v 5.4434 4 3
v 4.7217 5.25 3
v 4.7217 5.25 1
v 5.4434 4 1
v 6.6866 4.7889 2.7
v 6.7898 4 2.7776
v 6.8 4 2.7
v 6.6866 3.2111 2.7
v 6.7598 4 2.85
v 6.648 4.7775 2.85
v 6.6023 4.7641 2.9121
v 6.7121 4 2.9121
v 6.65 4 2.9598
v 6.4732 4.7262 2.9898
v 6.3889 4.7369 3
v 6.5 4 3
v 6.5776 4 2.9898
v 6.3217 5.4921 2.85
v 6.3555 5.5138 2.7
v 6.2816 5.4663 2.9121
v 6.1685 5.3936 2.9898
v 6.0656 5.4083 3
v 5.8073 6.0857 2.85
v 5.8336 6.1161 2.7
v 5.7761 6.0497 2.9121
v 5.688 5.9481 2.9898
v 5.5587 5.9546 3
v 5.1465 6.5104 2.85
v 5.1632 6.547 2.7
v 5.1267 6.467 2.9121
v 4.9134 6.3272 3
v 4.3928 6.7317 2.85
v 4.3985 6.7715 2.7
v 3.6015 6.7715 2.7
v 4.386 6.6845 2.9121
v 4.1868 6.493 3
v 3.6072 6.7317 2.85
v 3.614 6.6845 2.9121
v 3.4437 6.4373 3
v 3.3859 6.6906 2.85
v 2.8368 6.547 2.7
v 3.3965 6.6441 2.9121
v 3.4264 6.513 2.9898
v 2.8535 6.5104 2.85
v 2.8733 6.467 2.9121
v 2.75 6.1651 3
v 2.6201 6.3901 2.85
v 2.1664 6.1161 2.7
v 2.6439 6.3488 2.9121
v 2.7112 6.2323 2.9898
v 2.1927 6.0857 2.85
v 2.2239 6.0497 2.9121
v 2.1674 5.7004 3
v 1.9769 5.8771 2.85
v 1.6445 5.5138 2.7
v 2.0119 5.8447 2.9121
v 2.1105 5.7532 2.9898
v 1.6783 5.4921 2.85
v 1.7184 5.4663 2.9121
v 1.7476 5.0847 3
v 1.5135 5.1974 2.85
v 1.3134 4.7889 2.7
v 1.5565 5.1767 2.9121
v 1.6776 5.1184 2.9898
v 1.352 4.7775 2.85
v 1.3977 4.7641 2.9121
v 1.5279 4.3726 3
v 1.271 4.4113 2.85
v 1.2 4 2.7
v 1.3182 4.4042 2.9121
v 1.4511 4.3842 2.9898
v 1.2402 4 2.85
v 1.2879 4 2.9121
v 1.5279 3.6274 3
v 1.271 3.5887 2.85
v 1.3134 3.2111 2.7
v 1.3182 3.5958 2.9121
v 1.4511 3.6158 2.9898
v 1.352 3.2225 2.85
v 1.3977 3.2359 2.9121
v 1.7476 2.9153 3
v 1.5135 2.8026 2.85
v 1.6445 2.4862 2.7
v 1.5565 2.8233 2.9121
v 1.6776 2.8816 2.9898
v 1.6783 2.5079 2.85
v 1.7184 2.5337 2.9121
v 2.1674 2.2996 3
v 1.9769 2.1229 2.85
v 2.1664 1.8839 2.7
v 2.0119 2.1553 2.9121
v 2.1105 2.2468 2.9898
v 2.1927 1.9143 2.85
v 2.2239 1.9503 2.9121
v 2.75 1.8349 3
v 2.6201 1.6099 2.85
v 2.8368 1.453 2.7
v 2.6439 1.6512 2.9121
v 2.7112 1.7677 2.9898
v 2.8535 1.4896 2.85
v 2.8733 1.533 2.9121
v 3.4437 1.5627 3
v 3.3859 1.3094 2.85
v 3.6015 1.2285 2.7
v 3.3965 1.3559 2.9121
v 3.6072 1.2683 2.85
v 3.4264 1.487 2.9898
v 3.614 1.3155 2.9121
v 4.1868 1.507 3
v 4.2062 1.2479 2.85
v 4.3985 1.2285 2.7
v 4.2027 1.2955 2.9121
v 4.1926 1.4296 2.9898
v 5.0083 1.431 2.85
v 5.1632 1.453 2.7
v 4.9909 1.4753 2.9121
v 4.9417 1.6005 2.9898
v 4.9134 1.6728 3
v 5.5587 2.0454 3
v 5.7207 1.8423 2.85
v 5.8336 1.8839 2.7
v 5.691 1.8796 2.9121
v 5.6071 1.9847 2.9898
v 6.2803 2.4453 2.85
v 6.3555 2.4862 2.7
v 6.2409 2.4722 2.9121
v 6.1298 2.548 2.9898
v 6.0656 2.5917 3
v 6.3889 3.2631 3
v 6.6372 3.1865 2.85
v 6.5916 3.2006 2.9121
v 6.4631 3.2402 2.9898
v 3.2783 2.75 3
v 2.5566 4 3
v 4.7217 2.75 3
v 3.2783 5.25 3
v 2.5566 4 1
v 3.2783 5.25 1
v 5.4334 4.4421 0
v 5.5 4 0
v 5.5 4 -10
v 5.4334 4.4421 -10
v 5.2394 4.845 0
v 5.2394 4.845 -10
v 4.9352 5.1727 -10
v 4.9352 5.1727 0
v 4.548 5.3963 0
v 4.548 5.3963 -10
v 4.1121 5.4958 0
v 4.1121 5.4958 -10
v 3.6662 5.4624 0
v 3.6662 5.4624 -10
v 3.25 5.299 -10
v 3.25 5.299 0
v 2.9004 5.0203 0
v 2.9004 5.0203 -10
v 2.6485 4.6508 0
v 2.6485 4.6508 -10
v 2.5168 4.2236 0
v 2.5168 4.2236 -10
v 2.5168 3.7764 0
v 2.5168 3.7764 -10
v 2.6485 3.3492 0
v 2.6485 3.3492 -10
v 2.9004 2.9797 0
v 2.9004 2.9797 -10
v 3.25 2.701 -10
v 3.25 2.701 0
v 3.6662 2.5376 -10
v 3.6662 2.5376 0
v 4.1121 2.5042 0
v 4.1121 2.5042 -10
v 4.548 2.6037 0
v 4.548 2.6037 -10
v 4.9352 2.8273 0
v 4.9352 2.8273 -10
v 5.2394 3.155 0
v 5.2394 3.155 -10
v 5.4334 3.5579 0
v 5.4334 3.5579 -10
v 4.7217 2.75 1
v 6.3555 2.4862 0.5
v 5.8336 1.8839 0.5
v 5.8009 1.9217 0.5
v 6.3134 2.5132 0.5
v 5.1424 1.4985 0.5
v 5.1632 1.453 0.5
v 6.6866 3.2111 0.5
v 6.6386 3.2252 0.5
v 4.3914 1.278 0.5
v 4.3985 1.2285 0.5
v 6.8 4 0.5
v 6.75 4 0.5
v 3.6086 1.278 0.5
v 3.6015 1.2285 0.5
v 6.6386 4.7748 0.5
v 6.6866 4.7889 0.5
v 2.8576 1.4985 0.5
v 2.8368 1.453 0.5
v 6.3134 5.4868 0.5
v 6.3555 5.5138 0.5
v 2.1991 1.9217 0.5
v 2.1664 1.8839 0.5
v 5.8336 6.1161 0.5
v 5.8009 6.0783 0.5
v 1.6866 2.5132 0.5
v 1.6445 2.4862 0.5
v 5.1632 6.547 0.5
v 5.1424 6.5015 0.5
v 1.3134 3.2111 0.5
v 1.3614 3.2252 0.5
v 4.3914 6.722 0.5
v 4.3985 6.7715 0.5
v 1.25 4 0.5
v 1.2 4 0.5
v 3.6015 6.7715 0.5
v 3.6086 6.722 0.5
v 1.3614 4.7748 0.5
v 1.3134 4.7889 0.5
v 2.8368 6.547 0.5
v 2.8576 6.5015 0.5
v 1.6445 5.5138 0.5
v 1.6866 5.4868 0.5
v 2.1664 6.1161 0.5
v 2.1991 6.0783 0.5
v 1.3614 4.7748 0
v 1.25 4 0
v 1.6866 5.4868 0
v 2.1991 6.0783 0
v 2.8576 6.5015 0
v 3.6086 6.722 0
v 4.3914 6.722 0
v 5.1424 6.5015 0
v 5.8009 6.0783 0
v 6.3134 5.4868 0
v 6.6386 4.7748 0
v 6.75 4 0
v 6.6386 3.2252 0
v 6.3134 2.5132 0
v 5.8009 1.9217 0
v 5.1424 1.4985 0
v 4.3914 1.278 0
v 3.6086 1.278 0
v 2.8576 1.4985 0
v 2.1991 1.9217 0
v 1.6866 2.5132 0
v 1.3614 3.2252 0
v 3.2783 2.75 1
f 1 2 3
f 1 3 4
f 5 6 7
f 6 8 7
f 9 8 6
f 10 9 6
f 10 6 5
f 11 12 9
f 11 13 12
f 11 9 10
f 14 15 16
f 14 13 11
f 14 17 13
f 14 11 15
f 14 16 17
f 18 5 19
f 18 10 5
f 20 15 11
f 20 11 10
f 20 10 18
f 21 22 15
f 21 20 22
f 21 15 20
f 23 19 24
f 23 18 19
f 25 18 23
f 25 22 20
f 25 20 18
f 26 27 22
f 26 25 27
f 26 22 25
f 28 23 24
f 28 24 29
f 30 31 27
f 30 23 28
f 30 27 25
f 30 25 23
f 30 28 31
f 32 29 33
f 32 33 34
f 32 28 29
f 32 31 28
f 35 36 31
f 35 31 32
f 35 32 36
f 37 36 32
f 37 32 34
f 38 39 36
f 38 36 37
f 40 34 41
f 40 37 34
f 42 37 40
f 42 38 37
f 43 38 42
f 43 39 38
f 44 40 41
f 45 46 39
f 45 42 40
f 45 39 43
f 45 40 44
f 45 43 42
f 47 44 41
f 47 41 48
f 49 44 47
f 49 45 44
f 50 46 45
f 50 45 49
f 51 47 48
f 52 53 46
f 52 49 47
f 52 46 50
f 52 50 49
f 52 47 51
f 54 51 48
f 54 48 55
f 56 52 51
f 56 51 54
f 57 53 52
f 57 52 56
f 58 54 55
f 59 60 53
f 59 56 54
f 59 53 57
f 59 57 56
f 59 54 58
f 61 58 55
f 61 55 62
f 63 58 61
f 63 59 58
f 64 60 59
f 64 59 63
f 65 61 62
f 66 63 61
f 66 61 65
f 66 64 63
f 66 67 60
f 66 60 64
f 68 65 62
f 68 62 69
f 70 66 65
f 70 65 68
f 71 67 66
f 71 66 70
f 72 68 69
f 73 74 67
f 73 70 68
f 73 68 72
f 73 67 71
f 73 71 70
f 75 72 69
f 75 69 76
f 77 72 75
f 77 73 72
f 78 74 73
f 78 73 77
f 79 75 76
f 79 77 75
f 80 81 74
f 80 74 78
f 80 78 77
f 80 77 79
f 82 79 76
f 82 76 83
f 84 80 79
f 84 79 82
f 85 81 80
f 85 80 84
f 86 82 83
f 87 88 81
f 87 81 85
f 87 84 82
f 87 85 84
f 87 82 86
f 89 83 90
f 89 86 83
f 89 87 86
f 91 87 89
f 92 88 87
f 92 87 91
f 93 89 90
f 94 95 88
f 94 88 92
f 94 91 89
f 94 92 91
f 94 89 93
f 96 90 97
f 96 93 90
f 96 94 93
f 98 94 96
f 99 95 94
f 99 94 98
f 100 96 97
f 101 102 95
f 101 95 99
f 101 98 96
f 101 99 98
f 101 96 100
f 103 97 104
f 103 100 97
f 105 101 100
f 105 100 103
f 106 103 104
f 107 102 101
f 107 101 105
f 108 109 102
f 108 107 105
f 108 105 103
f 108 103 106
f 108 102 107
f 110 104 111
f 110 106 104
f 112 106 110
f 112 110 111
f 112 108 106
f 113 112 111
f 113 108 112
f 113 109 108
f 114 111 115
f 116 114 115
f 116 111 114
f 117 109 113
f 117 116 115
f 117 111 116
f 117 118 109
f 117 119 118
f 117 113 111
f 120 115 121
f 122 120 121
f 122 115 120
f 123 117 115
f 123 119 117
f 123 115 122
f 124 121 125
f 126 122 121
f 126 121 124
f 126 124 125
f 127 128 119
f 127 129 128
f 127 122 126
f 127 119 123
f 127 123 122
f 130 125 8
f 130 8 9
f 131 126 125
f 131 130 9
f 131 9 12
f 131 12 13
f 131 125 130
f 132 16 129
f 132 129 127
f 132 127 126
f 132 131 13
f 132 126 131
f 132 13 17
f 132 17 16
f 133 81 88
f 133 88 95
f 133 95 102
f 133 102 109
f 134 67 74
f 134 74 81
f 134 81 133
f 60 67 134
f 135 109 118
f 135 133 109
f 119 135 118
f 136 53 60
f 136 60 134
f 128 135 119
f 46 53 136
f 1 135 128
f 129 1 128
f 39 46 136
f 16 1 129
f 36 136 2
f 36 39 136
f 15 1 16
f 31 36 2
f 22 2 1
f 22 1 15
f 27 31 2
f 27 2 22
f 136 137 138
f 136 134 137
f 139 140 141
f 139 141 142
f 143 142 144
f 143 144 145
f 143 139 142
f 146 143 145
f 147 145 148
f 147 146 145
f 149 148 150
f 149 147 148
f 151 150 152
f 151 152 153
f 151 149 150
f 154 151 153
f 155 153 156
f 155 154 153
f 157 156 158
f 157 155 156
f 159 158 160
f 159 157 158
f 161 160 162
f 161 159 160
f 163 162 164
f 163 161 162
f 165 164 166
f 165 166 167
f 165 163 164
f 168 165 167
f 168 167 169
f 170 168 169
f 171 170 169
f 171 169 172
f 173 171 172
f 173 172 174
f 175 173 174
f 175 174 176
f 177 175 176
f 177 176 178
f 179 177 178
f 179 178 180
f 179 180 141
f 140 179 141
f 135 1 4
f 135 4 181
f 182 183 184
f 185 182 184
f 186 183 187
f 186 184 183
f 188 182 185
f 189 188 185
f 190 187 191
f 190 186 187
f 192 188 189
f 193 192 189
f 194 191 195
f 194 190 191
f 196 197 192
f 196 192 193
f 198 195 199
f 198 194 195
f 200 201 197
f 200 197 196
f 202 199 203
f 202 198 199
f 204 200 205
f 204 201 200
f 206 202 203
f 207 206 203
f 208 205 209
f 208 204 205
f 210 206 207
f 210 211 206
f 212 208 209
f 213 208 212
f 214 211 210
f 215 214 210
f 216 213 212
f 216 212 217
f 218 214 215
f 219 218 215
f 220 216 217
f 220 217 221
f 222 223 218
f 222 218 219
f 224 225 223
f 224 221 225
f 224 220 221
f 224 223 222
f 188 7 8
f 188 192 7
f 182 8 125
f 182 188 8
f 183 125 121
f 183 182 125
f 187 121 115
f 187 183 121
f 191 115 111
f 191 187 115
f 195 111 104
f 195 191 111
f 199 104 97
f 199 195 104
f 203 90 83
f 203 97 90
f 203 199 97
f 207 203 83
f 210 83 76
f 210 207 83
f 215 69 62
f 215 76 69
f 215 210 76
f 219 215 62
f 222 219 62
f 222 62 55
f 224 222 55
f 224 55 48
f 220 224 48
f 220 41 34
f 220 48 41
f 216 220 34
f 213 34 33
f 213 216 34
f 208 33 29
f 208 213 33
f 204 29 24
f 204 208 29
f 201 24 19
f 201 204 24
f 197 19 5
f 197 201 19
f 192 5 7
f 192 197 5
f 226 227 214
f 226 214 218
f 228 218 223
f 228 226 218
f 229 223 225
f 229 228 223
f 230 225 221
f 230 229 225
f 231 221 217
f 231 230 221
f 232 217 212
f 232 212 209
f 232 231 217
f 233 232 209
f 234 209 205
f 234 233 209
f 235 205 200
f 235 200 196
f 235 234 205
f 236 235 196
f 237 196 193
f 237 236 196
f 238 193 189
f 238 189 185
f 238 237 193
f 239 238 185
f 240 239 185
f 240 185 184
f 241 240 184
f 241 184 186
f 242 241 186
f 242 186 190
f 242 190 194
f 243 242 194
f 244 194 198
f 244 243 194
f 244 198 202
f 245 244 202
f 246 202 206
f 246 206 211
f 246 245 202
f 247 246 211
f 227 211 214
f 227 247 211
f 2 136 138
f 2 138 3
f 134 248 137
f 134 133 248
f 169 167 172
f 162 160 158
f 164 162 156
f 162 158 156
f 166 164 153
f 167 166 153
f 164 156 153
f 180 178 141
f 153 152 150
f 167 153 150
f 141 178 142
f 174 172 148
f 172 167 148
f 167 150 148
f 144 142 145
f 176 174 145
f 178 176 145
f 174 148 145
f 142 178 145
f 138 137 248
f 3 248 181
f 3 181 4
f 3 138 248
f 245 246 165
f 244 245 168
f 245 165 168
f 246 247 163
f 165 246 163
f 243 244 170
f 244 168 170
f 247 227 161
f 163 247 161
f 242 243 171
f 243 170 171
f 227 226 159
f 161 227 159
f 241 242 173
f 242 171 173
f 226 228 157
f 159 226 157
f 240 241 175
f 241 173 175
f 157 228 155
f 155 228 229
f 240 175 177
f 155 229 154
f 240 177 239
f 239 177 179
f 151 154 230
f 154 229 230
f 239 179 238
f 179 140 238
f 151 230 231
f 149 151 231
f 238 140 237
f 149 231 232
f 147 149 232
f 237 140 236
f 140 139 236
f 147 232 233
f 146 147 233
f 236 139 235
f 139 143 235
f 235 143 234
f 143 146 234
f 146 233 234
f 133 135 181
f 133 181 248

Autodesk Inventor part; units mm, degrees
ref_plane "YZ Plane" through (0, 0, 0) normal (1, 0, 0) x (0, 1, 0)
ref_plane "XZ Plane" through (0, 0, 0) normal (0, 1, 0) x (-1, 0, 0)
ref_plane "XY Plane" through (0, 0, 0) normal (0, 0, 1) x (1, 0, 0)
sketch "Sketch1" plane through (0, 0, 0) normal (0, 0, 1) x (1, 0, 0)
  circle A0 centre (4, 4) radius 1.2 projected
  circle A1 centre (4, 4) radius 1.5
  point P0 (0, 0)
  dimension "d0" = 3
extrude "Extrusion1" add sketch "Sketch1" against normal blind 10 contours A0 | A1
sketch "Sketch2" plane through (4, 4, 0) normal (0, 0, 1) x (1, 0, 0)
  circle A0 centre (0, 0) radius 1.5 projected
  circle A1 centre (0, 0) radius 2.8
  point P0 (-4, -4)
  dimension "d3" = 5.6
extrude "Extrusion2" add sketch "Sketch2" along normal blind 3 contours A0 | A1
fillet "Fillet1" radius 0.3 1 edges at (1.2, 4, 3)
sketch "Sketch3" plane through (4, 4, 0) normal (0, 0, -1) x (-1, 0, 0)
  circle A0 centre (0, 0) radius 2.8 projected
  circle A1 centre (0, 0) radius 1.5 projected
  circle A2 centre (0, 0) radius 2.75
  point P0 (4, -4)
  dimension "d7" = 5.5
extrude "Extrusion3" cut sketch "Sketch3" against normal blind 0.5 contours A0
sketch "Sketch4" plane through (4, 4, 3) normal (0, 0, 1) x (1, 0, 0)
  circle A0 centre (0, 0) radius 2.5 projected
  line L0 (0.7217, 1.25) -> (1.4434, 0)
  line L1 (1.4434, 0) -> (0.7217, -1.25)
  line L2 (0.7217, -1.25) -> (-0.7217, -1.25)
  line L3 (-0.7217, -1.25) -> (-1.4434, 0)
  line L4 (-1.4434, 0) -> (-0.7217, 1.25)
  line L5 (-0.7217, 1.25) -> (0.7217, 1.25)
  point P0 (-4, -4)
  dimension "d10" = 2.5
extrude "Extrusion4" cut sketch "Sketch4" against normal blind 2 contours L0 L1 L2 L3 L4 L5
thread "Thread1" size "M3x0.5" class "6g" standard "ANSI Metric M Profile" full length
properties part number "m3 6" material "Steel"
